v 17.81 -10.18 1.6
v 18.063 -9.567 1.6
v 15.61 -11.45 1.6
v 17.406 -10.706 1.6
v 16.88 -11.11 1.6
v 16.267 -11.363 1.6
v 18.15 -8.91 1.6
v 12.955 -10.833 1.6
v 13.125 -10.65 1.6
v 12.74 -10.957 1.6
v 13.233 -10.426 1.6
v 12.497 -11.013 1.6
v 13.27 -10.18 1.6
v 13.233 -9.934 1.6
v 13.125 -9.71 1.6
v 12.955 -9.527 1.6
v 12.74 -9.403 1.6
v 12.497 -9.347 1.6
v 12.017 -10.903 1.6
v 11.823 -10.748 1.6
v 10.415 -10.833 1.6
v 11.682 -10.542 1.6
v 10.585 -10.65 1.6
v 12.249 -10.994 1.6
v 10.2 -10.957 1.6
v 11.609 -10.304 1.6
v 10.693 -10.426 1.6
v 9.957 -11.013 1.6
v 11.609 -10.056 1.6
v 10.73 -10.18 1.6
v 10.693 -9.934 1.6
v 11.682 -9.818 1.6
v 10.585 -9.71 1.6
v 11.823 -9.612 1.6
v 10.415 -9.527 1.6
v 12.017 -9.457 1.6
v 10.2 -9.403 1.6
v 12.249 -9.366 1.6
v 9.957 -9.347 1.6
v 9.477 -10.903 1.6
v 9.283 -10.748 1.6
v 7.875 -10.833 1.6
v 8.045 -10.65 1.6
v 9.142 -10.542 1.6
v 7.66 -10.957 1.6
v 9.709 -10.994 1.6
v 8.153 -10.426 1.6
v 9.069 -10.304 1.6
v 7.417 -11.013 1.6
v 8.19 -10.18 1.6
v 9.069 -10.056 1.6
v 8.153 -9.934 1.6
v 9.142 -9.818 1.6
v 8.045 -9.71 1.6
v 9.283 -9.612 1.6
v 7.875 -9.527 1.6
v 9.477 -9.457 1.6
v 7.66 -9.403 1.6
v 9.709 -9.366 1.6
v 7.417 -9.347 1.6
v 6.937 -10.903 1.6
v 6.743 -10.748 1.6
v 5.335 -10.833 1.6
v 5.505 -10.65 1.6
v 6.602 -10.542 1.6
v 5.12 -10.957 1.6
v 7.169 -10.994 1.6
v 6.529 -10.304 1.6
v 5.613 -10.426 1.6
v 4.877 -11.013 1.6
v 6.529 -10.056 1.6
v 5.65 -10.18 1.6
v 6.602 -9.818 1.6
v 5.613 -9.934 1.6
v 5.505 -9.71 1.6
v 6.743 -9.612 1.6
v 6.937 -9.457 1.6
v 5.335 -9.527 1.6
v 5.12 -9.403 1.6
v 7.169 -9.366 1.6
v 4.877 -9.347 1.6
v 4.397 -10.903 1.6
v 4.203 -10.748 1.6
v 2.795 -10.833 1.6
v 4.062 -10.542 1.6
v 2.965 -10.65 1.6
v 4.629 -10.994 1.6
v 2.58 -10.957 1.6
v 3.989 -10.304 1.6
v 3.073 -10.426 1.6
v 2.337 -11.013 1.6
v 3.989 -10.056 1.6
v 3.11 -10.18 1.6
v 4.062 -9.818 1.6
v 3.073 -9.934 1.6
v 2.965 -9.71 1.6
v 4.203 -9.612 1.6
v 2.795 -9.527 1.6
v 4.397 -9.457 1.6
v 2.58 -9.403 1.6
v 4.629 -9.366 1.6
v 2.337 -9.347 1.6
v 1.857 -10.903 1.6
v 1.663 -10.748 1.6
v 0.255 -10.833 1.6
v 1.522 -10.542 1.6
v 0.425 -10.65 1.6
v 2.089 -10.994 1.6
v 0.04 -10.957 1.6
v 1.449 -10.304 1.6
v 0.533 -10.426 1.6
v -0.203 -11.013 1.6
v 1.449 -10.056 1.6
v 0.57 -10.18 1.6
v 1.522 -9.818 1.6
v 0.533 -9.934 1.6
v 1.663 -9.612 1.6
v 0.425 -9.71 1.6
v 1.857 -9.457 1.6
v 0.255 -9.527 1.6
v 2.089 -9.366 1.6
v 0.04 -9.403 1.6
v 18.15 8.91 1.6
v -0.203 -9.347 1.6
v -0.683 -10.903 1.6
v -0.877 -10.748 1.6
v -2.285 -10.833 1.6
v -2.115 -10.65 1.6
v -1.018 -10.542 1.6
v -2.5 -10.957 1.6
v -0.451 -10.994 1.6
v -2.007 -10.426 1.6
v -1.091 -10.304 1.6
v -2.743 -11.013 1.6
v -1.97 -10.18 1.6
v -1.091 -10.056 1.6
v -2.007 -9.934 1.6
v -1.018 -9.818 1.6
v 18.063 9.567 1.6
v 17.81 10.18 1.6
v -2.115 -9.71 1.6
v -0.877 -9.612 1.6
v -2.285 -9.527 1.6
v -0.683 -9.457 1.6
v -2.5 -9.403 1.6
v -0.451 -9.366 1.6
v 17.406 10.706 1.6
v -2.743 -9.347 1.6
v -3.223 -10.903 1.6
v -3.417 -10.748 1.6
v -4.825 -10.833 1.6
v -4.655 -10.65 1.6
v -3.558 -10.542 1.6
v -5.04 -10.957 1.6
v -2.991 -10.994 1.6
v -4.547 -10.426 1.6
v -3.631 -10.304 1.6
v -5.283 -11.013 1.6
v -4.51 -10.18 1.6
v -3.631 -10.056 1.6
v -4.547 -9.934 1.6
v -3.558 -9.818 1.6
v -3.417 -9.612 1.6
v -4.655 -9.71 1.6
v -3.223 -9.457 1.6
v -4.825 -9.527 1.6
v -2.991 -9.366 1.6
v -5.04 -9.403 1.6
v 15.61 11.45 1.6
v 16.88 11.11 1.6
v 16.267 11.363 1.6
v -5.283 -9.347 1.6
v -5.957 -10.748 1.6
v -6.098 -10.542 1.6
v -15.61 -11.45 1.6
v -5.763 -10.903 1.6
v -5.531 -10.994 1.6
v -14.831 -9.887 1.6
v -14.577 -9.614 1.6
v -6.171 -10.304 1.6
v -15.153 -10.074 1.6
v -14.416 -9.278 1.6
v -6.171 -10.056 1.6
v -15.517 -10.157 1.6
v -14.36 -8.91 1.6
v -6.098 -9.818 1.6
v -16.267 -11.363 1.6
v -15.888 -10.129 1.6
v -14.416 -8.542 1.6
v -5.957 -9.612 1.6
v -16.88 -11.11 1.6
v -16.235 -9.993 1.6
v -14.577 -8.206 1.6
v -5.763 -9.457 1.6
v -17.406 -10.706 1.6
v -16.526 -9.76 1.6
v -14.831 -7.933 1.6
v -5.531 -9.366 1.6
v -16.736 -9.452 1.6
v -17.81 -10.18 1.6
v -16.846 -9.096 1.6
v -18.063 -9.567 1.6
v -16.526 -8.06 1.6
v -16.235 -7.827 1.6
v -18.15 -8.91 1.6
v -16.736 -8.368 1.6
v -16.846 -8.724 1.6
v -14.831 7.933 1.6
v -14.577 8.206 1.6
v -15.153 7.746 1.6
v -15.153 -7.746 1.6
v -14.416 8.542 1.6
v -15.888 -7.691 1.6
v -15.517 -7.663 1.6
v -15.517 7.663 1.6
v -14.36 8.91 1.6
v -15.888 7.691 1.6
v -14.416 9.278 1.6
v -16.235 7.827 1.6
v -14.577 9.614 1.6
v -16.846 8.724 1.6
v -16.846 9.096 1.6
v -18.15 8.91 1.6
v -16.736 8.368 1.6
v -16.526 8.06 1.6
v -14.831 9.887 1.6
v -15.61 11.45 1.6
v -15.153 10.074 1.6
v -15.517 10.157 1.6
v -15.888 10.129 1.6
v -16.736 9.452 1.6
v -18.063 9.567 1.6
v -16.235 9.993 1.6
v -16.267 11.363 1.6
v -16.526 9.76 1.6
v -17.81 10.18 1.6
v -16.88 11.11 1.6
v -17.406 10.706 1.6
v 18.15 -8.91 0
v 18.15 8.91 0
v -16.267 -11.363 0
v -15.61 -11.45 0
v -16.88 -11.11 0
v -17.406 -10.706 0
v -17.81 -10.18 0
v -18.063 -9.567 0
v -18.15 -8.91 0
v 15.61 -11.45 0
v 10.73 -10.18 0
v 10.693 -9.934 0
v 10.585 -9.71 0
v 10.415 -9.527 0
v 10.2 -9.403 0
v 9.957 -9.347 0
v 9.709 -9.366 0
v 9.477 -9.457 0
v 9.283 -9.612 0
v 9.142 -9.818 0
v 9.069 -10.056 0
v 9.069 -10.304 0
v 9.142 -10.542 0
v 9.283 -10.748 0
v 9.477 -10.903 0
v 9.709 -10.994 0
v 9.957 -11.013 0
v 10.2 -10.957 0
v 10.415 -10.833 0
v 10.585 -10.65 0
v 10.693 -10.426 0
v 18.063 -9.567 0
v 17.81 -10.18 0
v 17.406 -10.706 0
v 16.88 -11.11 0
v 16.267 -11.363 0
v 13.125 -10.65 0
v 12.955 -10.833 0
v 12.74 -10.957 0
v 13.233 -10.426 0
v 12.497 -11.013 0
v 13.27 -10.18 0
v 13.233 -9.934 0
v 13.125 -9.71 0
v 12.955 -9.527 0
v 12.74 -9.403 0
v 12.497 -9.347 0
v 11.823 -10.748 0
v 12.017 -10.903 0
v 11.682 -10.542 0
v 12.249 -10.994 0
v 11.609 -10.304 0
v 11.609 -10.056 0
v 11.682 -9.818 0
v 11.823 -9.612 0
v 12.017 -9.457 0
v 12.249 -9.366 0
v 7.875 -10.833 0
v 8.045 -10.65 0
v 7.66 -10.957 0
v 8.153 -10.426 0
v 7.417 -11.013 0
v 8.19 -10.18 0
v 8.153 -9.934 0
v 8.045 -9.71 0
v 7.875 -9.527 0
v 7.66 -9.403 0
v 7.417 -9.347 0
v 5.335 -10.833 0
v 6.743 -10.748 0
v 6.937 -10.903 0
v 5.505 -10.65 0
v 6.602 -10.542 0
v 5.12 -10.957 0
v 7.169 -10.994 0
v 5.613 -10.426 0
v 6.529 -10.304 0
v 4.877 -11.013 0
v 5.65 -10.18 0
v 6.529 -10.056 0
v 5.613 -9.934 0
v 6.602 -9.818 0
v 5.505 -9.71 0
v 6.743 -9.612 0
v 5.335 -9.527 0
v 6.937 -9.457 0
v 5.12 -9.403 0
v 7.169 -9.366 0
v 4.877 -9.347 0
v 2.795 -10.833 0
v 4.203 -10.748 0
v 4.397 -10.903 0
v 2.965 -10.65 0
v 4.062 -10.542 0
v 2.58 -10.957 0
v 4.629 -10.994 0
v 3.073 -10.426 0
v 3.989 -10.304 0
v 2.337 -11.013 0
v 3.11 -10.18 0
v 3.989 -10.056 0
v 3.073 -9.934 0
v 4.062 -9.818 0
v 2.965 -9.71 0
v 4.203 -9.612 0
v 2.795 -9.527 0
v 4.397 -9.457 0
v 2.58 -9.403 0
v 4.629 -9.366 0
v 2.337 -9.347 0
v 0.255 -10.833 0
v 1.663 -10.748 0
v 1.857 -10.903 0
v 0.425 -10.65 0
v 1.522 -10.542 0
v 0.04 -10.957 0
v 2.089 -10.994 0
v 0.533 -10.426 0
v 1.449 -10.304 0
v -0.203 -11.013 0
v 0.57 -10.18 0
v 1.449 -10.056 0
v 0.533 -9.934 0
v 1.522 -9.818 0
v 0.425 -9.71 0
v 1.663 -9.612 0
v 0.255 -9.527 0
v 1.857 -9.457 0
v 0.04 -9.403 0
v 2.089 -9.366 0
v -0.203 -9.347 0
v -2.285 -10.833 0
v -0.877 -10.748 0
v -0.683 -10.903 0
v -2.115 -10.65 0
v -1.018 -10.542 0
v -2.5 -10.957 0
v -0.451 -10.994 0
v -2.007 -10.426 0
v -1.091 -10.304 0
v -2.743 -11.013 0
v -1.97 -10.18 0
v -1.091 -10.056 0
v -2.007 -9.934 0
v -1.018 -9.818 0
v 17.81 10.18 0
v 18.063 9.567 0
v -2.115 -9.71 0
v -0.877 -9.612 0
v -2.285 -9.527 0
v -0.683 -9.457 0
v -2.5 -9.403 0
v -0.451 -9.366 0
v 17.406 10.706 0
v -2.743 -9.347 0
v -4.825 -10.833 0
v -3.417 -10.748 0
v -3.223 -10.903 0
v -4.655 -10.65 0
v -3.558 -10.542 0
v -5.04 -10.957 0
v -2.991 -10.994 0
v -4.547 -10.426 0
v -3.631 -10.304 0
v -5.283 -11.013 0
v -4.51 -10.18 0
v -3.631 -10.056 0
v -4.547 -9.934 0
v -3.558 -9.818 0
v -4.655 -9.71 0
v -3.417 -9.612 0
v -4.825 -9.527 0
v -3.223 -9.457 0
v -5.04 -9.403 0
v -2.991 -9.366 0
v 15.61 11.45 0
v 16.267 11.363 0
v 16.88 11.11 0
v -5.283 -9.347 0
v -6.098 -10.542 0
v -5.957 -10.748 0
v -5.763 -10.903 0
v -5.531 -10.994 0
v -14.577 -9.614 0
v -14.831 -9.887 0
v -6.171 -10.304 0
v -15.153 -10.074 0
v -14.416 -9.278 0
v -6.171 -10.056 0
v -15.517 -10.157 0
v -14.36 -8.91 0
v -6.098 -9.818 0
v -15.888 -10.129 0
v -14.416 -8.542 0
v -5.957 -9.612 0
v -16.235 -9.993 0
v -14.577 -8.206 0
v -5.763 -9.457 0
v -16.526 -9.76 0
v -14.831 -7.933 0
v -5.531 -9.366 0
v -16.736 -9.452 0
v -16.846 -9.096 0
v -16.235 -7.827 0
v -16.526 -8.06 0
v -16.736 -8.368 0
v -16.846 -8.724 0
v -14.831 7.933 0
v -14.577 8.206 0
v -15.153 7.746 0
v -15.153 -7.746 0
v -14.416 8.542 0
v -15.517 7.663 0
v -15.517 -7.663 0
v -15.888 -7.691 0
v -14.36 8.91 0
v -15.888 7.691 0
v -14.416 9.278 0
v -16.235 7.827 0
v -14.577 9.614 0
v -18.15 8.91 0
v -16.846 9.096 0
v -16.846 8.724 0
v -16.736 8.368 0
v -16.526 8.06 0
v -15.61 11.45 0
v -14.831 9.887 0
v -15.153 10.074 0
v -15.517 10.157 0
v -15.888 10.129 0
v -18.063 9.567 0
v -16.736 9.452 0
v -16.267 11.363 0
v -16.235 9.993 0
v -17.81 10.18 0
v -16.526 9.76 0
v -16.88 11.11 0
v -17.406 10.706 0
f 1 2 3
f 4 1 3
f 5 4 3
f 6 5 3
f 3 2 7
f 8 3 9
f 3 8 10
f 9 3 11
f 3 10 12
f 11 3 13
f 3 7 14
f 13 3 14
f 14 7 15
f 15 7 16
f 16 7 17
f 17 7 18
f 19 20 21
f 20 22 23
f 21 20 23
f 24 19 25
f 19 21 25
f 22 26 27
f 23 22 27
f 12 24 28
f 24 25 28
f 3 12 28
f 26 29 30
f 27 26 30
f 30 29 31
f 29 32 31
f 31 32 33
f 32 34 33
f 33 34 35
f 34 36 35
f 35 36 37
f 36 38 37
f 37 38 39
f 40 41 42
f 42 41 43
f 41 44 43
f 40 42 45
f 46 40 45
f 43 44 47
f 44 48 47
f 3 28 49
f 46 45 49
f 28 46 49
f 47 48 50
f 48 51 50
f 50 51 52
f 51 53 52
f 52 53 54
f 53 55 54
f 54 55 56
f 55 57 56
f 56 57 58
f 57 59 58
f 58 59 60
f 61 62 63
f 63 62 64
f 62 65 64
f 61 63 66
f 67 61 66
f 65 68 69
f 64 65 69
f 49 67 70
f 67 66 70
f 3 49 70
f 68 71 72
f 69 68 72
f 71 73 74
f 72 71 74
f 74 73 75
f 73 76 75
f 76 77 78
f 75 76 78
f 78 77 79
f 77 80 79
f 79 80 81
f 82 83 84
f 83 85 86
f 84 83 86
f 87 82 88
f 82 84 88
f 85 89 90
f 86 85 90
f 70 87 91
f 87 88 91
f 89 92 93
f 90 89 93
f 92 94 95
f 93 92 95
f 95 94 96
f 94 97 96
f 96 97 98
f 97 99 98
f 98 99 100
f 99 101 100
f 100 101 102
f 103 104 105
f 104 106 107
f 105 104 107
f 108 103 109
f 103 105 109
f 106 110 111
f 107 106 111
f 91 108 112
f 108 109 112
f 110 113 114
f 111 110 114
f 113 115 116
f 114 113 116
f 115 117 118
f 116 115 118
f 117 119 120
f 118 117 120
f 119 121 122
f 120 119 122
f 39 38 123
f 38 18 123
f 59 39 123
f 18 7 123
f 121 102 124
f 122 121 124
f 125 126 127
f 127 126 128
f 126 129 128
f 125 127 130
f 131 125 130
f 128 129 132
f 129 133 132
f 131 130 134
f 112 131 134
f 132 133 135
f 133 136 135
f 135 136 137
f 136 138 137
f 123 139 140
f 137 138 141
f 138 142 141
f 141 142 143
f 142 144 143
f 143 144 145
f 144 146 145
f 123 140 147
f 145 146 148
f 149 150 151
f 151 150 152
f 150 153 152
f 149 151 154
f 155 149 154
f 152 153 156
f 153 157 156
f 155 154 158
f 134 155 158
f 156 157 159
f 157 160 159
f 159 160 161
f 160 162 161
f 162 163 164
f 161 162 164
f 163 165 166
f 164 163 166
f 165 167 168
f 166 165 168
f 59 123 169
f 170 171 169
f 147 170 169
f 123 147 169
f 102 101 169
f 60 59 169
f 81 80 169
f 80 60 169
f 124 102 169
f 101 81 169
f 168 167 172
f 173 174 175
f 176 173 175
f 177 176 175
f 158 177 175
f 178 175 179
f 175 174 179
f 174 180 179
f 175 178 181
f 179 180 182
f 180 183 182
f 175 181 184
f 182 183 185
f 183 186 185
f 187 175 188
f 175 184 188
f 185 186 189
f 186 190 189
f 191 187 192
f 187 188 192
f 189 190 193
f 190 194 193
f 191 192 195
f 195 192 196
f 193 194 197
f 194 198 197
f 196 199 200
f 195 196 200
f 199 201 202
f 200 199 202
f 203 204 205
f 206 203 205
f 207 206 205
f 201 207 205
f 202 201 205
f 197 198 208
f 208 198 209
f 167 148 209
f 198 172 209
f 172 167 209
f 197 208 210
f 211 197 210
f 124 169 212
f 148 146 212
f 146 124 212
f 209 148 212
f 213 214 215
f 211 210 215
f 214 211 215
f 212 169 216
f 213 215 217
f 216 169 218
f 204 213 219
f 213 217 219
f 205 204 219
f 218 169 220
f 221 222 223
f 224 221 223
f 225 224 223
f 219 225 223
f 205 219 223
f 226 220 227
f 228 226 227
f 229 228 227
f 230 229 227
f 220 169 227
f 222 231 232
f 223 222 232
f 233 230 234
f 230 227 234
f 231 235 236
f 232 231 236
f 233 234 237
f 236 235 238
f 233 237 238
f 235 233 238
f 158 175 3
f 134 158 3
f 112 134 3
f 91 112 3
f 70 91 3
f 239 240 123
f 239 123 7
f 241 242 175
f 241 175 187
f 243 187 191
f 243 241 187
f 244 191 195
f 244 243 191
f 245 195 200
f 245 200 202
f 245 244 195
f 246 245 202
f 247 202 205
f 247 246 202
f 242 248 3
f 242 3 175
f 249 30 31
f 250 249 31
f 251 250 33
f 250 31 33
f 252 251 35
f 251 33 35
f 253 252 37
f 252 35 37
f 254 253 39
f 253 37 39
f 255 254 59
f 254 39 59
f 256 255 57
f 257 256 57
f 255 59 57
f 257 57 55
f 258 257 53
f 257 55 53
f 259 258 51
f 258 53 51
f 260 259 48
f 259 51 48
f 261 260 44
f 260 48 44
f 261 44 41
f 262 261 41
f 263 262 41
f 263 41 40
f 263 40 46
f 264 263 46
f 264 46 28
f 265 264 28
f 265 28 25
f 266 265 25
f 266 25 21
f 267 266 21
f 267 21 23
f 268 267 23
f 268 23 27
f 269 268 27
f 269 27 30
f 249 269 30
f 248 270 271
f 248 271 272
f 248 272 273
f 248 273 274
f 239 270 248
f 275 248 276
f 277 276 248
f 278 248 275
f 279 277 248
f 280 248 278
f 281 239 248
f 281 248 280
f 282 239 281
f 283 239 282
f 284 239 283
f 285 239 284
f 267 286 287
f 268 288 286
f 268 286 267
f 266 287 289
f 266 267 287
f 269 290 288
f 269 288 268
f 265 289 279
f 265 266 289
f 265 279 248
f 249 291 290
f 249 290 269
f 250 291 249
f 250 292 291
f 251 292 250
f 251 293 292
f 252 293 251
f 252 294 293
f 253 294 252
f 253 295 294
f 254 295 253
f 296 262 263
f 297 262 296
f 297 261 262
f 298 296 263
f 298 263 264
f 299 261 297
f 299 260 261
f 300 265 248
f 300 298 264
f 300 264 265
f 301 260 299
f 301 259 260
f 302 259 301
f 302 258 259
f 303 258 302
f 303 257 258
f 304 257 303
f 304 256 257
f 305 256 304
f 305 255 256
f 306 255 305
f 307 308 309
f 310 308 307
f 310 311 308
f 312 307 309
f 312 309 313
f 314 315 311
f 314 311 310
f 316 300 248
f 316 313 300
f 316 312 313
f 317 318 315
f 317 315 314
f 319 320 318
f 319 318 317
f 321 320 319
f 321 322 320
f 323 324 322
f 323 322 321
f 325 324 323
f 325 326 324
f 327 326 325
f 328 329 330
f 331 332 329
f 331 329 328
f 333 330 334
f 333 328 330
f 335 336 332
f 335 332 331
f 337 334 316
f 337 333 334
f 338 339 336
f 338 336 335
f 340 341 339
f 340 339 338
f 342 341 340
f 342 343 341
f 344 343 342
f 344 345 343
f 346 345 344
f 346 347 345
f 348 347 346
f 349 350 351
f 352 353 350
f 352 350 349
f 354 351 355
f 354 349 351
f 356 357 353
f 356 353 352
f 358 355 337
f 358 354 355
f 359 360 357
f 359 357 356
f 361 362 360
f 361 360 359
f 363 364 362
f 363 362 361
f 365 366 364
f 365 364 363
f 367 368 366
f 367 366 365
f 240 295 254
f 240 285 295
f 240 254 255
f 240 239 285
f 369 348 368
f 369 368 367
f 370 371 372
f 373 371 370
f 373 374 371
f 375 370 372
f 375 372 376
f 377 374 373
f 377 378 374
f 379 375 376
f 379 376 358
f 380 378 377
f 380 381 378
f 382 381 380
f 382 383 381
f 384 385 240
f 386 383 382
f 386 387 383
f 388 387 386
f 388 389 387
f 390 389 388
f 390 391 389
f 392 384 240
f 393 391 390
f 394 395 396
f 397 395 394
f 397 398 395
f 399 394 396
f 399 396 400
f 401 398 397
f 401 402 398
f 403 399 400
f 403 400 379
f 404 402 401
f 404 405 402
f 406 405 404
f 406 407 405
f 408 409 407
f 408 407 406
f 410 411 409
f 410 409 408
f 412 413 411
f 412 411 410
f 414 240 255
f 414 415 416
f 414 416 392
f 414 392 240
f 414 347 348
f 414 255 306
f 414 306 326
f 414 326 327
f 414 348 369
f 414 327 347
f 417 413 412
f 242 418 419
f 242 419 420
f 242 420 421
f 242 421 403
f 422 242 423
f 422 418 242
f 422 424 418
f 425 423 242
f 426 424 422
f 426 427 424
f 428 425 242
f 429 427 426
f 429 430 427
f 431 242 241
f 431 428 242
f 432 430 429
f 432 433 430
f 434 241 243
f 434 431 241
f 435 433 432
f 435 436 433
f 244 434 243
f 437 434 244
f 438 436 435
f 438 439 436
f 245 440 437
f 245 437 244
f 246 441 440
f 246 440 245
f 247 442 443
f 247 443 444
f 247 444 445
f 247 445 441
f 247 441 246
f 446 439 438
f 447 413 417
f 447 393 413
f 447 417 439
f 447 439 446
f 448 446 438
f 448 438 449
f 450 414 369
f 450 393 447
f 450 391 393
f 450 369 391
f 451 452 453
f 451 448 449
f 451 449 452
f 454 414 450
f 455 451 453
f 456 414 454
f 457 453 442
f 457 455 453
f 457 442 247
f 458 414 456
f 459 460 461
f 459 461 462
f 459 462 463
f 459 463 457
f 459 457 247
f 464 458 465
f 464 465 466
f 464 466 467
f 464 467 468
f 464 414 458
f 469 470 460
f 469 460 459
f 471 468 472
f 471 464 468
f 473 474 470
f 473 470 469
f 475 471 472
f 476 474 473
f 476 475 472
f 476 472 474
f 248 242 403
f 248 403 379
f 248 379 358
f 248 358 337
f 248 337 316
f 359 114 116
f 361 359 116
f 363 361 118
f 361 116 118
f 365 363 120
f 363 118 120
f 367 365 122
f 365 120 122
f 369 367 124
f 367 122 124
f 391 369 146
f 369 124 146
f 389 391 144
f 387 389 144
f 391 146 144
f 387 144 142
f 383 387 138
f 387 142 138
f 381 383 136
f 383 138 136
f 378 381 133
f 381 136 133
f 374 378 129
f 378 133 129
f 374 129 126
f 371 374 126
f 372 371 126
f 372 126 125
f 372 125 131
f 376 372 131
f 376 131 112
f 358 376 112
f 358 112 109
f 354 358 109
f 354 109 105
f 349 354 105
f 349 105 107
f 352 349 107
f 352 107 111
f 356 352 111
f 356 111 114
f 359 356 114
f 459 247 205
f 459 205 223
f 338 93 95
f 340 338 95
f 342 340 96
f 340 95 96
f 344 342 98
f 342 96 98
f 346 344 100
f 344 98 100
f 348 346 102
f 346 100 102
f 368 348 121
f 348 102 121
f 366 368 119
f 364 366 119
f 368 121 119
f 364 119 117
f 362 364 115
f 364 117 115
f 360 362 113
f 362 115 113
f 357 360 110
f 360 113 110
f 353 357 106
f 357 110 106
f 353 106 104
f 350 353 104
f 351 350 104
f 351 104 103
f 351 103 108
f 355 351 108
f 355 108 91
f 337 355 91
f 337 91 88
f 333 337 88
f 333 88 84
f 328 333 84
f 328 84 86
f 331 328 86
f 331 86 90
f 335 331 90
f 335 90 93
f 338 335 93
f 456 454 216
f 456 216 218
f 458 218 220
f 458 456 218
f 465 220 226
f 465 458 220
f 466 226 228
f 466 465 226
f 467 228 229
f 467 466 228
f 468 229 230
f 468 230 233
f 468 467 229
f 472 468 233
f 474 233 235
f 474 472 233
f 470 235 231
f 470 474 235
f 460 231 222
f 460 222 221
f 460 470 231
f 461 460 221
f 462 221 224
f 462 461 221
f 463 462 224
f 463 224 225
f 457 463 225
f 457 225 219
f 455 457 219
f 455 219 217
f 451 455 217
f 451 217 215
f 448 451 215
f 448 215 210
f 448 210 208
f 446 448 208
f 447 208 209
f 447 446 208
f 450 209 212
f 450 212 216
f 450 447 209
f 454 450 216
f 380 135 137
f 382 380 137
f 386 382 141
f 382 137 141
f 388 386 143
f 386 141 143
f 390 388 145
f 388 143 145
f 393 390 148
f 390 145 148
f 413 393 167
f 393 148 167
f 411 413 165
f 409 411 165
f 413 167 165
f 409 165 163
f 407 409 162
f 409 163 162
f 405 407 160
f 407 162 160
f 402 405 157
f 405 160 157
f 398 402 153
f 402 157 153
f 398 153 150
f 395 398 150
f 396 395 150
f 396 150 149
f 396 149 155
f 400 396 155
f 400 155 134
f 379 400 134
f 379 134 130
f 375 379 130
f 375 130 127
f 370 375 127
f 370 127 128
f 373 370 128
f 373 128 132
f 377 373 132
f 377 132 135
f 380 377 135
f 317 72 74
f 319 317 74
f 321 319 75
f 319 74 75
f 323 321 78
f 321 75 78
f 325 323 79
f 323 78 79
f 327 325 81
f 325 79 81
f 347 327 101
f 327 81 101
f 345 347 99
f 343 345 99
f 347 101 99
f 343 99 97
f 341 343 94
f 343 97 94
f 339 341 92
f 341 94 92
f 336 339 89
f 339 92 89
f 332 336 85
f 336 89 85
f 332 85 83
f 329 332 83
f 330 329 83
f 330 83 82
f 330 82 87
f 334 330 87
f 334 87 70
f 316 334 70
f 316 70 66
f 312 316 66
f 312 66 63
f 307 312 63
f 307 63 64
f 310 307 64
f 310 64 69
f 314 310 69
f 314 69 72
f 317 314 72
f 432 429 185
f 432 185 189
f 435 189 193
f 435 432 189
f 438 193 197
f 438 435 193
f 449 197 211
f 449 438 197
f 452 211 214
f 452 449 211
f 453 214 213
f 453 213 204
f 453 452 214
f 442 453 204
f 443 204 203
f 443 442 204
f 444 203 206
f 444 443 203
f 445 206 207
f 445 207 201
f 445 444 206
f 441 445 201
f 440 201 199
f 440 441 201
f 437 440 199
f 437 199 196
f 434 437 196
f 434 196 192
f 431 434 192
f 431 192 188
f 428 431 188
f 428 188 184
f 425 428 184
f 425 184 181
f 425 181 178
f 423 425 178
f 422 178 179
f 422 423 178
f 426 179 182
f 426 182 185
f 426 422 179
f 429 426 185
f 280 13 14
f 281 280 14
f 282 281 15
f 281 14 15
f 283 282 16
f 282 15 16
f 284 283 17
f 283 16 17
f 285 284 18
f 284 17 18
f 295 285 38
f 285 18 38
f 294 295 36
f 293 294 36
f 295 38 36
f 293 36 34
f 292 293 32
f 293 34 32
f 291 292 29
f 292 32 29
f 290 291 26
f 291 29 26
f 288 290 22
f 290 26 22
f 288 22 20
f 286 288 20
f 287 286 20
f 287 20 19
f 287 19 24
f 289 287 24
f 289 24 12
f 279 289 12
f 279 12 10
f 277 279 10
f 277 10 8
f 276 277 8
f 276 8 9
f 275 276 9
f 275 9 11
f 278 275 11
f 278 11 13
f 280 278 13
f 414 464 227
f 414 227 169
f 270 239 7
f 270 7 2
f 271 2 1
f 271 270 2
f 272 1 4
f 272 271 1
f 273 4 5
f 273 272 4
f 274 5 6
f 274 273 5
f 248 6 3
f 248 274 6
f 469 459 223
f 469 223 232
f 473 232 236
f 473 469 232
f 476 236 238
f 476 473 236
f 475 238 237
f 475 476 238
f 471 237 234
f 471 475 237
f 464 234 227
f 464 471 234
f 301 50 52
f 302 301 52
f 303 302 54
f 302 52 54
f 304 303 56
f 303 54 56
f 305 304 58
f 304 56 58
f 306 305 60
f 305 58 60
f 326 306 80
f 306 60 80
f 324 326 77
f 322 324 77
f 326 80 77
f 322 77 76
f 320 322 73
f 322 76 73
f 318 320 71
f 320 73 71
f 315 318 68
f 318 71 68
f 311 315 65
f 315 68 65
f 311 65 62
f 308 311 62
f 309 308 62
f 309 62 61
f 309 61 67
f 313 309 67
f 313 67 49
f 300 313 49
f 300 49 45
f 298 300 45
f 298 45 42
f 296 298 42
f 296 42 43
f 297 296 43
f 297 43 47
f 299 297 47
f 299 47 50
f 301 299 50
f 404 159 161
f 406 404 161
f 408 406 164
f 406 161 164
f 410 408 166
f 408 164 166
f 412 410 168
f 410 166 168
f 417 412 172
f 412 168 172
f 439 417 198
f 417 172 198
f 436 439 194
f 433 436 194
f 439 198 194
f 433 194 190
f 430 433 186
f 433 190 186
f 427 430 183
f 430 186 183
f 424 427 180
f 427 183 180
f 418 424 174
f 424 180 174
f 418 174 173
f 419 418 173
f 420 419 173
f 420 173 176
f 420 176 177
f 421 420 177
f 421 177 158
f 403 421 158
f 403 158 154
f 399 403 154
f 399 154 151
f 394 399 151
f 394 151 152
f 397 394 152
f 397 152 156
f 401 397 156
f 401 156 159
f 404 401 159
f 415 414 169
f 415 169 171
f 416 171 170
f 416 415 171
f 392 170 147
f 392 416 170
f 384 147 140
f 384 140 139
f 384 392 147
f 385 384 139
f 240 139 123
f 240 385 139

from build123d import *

# Parameters (mm, degrees)
SKETCH1_R           = 1.25
BOSS_EXTRUDE1_DEPTH = 1.6
SKETCH2_R           = 0.835
CUT_EXTRUDE1_DEPTH  = 10


with BuildPart() as part:
    # Sketch1 → Boss-Extrude1 (new body)
    with BuildSketch(Plane.XY):
        with BuildLine():
            Line((15.61, -11.45), (-15.61, -11.45))
            ThreePointArc((-15.61, -11.45), (-17.406051224, -10.706051224), (-18.15, -8.91))
            Line((-18.15, -8.91), (-18.15, 8.91))
            ThreePointArc((-18.15, 8.91), (-17.406051224, 10.706051224), (-15.61, 11.45))
            Line((-15.61, 11.45), (15.61, 11.45))
            ThreePointArc((15.61, 11.45), (17.406051224, 10.706051224), (18.15, 8.91))
            Line((18.15, 8.91), (18.15, -8.91))
            ThreePointArc((18.15, -8.91), (17.406051224, -10.706051224), (15.61, -11.45))
        make_face()
        with Locations((-15.61, 8.91)):
            Circle(SKETCH1_R, mode=Mode.SUBTRACT)
        with Locations((-15.61, -8.91)):
            Circle(SKETCH1_R, mode=Mode.SUBTRACT)
    extrude(amount=BOSS_EXTRUDE1_DEPTH)

    # Sketch2 → Cut-Extrude1 (cut)
    with BuildSketch(Plane.XY.offset(1.6)):
        with Locations((12.4347, -10.18)):
            Circle(SKETCH2_R)
        with Locations((9.8947, -10.18)):
            Circle(SKETCH2_R)
        with Locations((7.3547, -10.18)):
            Circle(SKETCH2_R)
        with Locations((4.8147, -10.18)):
            Circle(SKETCH2_R)
        with Locations((2.2747, -10.18)):
            Circle(SKETCH2_R)
        with Locations((-0.2653, -10.18)):
            Circle(SKETCH2_R)
        with Locations((-2.8053, -10.18)):
            Circle(SKETCH2_R)
        with Locations((-5.3453, -10.18)):
            Circle(SKETCH2_R)
    extrude(amount=-CUT_EXTRUDE1_DEPTH, mode=Mode.SUBTRACT)


solid = part.part
